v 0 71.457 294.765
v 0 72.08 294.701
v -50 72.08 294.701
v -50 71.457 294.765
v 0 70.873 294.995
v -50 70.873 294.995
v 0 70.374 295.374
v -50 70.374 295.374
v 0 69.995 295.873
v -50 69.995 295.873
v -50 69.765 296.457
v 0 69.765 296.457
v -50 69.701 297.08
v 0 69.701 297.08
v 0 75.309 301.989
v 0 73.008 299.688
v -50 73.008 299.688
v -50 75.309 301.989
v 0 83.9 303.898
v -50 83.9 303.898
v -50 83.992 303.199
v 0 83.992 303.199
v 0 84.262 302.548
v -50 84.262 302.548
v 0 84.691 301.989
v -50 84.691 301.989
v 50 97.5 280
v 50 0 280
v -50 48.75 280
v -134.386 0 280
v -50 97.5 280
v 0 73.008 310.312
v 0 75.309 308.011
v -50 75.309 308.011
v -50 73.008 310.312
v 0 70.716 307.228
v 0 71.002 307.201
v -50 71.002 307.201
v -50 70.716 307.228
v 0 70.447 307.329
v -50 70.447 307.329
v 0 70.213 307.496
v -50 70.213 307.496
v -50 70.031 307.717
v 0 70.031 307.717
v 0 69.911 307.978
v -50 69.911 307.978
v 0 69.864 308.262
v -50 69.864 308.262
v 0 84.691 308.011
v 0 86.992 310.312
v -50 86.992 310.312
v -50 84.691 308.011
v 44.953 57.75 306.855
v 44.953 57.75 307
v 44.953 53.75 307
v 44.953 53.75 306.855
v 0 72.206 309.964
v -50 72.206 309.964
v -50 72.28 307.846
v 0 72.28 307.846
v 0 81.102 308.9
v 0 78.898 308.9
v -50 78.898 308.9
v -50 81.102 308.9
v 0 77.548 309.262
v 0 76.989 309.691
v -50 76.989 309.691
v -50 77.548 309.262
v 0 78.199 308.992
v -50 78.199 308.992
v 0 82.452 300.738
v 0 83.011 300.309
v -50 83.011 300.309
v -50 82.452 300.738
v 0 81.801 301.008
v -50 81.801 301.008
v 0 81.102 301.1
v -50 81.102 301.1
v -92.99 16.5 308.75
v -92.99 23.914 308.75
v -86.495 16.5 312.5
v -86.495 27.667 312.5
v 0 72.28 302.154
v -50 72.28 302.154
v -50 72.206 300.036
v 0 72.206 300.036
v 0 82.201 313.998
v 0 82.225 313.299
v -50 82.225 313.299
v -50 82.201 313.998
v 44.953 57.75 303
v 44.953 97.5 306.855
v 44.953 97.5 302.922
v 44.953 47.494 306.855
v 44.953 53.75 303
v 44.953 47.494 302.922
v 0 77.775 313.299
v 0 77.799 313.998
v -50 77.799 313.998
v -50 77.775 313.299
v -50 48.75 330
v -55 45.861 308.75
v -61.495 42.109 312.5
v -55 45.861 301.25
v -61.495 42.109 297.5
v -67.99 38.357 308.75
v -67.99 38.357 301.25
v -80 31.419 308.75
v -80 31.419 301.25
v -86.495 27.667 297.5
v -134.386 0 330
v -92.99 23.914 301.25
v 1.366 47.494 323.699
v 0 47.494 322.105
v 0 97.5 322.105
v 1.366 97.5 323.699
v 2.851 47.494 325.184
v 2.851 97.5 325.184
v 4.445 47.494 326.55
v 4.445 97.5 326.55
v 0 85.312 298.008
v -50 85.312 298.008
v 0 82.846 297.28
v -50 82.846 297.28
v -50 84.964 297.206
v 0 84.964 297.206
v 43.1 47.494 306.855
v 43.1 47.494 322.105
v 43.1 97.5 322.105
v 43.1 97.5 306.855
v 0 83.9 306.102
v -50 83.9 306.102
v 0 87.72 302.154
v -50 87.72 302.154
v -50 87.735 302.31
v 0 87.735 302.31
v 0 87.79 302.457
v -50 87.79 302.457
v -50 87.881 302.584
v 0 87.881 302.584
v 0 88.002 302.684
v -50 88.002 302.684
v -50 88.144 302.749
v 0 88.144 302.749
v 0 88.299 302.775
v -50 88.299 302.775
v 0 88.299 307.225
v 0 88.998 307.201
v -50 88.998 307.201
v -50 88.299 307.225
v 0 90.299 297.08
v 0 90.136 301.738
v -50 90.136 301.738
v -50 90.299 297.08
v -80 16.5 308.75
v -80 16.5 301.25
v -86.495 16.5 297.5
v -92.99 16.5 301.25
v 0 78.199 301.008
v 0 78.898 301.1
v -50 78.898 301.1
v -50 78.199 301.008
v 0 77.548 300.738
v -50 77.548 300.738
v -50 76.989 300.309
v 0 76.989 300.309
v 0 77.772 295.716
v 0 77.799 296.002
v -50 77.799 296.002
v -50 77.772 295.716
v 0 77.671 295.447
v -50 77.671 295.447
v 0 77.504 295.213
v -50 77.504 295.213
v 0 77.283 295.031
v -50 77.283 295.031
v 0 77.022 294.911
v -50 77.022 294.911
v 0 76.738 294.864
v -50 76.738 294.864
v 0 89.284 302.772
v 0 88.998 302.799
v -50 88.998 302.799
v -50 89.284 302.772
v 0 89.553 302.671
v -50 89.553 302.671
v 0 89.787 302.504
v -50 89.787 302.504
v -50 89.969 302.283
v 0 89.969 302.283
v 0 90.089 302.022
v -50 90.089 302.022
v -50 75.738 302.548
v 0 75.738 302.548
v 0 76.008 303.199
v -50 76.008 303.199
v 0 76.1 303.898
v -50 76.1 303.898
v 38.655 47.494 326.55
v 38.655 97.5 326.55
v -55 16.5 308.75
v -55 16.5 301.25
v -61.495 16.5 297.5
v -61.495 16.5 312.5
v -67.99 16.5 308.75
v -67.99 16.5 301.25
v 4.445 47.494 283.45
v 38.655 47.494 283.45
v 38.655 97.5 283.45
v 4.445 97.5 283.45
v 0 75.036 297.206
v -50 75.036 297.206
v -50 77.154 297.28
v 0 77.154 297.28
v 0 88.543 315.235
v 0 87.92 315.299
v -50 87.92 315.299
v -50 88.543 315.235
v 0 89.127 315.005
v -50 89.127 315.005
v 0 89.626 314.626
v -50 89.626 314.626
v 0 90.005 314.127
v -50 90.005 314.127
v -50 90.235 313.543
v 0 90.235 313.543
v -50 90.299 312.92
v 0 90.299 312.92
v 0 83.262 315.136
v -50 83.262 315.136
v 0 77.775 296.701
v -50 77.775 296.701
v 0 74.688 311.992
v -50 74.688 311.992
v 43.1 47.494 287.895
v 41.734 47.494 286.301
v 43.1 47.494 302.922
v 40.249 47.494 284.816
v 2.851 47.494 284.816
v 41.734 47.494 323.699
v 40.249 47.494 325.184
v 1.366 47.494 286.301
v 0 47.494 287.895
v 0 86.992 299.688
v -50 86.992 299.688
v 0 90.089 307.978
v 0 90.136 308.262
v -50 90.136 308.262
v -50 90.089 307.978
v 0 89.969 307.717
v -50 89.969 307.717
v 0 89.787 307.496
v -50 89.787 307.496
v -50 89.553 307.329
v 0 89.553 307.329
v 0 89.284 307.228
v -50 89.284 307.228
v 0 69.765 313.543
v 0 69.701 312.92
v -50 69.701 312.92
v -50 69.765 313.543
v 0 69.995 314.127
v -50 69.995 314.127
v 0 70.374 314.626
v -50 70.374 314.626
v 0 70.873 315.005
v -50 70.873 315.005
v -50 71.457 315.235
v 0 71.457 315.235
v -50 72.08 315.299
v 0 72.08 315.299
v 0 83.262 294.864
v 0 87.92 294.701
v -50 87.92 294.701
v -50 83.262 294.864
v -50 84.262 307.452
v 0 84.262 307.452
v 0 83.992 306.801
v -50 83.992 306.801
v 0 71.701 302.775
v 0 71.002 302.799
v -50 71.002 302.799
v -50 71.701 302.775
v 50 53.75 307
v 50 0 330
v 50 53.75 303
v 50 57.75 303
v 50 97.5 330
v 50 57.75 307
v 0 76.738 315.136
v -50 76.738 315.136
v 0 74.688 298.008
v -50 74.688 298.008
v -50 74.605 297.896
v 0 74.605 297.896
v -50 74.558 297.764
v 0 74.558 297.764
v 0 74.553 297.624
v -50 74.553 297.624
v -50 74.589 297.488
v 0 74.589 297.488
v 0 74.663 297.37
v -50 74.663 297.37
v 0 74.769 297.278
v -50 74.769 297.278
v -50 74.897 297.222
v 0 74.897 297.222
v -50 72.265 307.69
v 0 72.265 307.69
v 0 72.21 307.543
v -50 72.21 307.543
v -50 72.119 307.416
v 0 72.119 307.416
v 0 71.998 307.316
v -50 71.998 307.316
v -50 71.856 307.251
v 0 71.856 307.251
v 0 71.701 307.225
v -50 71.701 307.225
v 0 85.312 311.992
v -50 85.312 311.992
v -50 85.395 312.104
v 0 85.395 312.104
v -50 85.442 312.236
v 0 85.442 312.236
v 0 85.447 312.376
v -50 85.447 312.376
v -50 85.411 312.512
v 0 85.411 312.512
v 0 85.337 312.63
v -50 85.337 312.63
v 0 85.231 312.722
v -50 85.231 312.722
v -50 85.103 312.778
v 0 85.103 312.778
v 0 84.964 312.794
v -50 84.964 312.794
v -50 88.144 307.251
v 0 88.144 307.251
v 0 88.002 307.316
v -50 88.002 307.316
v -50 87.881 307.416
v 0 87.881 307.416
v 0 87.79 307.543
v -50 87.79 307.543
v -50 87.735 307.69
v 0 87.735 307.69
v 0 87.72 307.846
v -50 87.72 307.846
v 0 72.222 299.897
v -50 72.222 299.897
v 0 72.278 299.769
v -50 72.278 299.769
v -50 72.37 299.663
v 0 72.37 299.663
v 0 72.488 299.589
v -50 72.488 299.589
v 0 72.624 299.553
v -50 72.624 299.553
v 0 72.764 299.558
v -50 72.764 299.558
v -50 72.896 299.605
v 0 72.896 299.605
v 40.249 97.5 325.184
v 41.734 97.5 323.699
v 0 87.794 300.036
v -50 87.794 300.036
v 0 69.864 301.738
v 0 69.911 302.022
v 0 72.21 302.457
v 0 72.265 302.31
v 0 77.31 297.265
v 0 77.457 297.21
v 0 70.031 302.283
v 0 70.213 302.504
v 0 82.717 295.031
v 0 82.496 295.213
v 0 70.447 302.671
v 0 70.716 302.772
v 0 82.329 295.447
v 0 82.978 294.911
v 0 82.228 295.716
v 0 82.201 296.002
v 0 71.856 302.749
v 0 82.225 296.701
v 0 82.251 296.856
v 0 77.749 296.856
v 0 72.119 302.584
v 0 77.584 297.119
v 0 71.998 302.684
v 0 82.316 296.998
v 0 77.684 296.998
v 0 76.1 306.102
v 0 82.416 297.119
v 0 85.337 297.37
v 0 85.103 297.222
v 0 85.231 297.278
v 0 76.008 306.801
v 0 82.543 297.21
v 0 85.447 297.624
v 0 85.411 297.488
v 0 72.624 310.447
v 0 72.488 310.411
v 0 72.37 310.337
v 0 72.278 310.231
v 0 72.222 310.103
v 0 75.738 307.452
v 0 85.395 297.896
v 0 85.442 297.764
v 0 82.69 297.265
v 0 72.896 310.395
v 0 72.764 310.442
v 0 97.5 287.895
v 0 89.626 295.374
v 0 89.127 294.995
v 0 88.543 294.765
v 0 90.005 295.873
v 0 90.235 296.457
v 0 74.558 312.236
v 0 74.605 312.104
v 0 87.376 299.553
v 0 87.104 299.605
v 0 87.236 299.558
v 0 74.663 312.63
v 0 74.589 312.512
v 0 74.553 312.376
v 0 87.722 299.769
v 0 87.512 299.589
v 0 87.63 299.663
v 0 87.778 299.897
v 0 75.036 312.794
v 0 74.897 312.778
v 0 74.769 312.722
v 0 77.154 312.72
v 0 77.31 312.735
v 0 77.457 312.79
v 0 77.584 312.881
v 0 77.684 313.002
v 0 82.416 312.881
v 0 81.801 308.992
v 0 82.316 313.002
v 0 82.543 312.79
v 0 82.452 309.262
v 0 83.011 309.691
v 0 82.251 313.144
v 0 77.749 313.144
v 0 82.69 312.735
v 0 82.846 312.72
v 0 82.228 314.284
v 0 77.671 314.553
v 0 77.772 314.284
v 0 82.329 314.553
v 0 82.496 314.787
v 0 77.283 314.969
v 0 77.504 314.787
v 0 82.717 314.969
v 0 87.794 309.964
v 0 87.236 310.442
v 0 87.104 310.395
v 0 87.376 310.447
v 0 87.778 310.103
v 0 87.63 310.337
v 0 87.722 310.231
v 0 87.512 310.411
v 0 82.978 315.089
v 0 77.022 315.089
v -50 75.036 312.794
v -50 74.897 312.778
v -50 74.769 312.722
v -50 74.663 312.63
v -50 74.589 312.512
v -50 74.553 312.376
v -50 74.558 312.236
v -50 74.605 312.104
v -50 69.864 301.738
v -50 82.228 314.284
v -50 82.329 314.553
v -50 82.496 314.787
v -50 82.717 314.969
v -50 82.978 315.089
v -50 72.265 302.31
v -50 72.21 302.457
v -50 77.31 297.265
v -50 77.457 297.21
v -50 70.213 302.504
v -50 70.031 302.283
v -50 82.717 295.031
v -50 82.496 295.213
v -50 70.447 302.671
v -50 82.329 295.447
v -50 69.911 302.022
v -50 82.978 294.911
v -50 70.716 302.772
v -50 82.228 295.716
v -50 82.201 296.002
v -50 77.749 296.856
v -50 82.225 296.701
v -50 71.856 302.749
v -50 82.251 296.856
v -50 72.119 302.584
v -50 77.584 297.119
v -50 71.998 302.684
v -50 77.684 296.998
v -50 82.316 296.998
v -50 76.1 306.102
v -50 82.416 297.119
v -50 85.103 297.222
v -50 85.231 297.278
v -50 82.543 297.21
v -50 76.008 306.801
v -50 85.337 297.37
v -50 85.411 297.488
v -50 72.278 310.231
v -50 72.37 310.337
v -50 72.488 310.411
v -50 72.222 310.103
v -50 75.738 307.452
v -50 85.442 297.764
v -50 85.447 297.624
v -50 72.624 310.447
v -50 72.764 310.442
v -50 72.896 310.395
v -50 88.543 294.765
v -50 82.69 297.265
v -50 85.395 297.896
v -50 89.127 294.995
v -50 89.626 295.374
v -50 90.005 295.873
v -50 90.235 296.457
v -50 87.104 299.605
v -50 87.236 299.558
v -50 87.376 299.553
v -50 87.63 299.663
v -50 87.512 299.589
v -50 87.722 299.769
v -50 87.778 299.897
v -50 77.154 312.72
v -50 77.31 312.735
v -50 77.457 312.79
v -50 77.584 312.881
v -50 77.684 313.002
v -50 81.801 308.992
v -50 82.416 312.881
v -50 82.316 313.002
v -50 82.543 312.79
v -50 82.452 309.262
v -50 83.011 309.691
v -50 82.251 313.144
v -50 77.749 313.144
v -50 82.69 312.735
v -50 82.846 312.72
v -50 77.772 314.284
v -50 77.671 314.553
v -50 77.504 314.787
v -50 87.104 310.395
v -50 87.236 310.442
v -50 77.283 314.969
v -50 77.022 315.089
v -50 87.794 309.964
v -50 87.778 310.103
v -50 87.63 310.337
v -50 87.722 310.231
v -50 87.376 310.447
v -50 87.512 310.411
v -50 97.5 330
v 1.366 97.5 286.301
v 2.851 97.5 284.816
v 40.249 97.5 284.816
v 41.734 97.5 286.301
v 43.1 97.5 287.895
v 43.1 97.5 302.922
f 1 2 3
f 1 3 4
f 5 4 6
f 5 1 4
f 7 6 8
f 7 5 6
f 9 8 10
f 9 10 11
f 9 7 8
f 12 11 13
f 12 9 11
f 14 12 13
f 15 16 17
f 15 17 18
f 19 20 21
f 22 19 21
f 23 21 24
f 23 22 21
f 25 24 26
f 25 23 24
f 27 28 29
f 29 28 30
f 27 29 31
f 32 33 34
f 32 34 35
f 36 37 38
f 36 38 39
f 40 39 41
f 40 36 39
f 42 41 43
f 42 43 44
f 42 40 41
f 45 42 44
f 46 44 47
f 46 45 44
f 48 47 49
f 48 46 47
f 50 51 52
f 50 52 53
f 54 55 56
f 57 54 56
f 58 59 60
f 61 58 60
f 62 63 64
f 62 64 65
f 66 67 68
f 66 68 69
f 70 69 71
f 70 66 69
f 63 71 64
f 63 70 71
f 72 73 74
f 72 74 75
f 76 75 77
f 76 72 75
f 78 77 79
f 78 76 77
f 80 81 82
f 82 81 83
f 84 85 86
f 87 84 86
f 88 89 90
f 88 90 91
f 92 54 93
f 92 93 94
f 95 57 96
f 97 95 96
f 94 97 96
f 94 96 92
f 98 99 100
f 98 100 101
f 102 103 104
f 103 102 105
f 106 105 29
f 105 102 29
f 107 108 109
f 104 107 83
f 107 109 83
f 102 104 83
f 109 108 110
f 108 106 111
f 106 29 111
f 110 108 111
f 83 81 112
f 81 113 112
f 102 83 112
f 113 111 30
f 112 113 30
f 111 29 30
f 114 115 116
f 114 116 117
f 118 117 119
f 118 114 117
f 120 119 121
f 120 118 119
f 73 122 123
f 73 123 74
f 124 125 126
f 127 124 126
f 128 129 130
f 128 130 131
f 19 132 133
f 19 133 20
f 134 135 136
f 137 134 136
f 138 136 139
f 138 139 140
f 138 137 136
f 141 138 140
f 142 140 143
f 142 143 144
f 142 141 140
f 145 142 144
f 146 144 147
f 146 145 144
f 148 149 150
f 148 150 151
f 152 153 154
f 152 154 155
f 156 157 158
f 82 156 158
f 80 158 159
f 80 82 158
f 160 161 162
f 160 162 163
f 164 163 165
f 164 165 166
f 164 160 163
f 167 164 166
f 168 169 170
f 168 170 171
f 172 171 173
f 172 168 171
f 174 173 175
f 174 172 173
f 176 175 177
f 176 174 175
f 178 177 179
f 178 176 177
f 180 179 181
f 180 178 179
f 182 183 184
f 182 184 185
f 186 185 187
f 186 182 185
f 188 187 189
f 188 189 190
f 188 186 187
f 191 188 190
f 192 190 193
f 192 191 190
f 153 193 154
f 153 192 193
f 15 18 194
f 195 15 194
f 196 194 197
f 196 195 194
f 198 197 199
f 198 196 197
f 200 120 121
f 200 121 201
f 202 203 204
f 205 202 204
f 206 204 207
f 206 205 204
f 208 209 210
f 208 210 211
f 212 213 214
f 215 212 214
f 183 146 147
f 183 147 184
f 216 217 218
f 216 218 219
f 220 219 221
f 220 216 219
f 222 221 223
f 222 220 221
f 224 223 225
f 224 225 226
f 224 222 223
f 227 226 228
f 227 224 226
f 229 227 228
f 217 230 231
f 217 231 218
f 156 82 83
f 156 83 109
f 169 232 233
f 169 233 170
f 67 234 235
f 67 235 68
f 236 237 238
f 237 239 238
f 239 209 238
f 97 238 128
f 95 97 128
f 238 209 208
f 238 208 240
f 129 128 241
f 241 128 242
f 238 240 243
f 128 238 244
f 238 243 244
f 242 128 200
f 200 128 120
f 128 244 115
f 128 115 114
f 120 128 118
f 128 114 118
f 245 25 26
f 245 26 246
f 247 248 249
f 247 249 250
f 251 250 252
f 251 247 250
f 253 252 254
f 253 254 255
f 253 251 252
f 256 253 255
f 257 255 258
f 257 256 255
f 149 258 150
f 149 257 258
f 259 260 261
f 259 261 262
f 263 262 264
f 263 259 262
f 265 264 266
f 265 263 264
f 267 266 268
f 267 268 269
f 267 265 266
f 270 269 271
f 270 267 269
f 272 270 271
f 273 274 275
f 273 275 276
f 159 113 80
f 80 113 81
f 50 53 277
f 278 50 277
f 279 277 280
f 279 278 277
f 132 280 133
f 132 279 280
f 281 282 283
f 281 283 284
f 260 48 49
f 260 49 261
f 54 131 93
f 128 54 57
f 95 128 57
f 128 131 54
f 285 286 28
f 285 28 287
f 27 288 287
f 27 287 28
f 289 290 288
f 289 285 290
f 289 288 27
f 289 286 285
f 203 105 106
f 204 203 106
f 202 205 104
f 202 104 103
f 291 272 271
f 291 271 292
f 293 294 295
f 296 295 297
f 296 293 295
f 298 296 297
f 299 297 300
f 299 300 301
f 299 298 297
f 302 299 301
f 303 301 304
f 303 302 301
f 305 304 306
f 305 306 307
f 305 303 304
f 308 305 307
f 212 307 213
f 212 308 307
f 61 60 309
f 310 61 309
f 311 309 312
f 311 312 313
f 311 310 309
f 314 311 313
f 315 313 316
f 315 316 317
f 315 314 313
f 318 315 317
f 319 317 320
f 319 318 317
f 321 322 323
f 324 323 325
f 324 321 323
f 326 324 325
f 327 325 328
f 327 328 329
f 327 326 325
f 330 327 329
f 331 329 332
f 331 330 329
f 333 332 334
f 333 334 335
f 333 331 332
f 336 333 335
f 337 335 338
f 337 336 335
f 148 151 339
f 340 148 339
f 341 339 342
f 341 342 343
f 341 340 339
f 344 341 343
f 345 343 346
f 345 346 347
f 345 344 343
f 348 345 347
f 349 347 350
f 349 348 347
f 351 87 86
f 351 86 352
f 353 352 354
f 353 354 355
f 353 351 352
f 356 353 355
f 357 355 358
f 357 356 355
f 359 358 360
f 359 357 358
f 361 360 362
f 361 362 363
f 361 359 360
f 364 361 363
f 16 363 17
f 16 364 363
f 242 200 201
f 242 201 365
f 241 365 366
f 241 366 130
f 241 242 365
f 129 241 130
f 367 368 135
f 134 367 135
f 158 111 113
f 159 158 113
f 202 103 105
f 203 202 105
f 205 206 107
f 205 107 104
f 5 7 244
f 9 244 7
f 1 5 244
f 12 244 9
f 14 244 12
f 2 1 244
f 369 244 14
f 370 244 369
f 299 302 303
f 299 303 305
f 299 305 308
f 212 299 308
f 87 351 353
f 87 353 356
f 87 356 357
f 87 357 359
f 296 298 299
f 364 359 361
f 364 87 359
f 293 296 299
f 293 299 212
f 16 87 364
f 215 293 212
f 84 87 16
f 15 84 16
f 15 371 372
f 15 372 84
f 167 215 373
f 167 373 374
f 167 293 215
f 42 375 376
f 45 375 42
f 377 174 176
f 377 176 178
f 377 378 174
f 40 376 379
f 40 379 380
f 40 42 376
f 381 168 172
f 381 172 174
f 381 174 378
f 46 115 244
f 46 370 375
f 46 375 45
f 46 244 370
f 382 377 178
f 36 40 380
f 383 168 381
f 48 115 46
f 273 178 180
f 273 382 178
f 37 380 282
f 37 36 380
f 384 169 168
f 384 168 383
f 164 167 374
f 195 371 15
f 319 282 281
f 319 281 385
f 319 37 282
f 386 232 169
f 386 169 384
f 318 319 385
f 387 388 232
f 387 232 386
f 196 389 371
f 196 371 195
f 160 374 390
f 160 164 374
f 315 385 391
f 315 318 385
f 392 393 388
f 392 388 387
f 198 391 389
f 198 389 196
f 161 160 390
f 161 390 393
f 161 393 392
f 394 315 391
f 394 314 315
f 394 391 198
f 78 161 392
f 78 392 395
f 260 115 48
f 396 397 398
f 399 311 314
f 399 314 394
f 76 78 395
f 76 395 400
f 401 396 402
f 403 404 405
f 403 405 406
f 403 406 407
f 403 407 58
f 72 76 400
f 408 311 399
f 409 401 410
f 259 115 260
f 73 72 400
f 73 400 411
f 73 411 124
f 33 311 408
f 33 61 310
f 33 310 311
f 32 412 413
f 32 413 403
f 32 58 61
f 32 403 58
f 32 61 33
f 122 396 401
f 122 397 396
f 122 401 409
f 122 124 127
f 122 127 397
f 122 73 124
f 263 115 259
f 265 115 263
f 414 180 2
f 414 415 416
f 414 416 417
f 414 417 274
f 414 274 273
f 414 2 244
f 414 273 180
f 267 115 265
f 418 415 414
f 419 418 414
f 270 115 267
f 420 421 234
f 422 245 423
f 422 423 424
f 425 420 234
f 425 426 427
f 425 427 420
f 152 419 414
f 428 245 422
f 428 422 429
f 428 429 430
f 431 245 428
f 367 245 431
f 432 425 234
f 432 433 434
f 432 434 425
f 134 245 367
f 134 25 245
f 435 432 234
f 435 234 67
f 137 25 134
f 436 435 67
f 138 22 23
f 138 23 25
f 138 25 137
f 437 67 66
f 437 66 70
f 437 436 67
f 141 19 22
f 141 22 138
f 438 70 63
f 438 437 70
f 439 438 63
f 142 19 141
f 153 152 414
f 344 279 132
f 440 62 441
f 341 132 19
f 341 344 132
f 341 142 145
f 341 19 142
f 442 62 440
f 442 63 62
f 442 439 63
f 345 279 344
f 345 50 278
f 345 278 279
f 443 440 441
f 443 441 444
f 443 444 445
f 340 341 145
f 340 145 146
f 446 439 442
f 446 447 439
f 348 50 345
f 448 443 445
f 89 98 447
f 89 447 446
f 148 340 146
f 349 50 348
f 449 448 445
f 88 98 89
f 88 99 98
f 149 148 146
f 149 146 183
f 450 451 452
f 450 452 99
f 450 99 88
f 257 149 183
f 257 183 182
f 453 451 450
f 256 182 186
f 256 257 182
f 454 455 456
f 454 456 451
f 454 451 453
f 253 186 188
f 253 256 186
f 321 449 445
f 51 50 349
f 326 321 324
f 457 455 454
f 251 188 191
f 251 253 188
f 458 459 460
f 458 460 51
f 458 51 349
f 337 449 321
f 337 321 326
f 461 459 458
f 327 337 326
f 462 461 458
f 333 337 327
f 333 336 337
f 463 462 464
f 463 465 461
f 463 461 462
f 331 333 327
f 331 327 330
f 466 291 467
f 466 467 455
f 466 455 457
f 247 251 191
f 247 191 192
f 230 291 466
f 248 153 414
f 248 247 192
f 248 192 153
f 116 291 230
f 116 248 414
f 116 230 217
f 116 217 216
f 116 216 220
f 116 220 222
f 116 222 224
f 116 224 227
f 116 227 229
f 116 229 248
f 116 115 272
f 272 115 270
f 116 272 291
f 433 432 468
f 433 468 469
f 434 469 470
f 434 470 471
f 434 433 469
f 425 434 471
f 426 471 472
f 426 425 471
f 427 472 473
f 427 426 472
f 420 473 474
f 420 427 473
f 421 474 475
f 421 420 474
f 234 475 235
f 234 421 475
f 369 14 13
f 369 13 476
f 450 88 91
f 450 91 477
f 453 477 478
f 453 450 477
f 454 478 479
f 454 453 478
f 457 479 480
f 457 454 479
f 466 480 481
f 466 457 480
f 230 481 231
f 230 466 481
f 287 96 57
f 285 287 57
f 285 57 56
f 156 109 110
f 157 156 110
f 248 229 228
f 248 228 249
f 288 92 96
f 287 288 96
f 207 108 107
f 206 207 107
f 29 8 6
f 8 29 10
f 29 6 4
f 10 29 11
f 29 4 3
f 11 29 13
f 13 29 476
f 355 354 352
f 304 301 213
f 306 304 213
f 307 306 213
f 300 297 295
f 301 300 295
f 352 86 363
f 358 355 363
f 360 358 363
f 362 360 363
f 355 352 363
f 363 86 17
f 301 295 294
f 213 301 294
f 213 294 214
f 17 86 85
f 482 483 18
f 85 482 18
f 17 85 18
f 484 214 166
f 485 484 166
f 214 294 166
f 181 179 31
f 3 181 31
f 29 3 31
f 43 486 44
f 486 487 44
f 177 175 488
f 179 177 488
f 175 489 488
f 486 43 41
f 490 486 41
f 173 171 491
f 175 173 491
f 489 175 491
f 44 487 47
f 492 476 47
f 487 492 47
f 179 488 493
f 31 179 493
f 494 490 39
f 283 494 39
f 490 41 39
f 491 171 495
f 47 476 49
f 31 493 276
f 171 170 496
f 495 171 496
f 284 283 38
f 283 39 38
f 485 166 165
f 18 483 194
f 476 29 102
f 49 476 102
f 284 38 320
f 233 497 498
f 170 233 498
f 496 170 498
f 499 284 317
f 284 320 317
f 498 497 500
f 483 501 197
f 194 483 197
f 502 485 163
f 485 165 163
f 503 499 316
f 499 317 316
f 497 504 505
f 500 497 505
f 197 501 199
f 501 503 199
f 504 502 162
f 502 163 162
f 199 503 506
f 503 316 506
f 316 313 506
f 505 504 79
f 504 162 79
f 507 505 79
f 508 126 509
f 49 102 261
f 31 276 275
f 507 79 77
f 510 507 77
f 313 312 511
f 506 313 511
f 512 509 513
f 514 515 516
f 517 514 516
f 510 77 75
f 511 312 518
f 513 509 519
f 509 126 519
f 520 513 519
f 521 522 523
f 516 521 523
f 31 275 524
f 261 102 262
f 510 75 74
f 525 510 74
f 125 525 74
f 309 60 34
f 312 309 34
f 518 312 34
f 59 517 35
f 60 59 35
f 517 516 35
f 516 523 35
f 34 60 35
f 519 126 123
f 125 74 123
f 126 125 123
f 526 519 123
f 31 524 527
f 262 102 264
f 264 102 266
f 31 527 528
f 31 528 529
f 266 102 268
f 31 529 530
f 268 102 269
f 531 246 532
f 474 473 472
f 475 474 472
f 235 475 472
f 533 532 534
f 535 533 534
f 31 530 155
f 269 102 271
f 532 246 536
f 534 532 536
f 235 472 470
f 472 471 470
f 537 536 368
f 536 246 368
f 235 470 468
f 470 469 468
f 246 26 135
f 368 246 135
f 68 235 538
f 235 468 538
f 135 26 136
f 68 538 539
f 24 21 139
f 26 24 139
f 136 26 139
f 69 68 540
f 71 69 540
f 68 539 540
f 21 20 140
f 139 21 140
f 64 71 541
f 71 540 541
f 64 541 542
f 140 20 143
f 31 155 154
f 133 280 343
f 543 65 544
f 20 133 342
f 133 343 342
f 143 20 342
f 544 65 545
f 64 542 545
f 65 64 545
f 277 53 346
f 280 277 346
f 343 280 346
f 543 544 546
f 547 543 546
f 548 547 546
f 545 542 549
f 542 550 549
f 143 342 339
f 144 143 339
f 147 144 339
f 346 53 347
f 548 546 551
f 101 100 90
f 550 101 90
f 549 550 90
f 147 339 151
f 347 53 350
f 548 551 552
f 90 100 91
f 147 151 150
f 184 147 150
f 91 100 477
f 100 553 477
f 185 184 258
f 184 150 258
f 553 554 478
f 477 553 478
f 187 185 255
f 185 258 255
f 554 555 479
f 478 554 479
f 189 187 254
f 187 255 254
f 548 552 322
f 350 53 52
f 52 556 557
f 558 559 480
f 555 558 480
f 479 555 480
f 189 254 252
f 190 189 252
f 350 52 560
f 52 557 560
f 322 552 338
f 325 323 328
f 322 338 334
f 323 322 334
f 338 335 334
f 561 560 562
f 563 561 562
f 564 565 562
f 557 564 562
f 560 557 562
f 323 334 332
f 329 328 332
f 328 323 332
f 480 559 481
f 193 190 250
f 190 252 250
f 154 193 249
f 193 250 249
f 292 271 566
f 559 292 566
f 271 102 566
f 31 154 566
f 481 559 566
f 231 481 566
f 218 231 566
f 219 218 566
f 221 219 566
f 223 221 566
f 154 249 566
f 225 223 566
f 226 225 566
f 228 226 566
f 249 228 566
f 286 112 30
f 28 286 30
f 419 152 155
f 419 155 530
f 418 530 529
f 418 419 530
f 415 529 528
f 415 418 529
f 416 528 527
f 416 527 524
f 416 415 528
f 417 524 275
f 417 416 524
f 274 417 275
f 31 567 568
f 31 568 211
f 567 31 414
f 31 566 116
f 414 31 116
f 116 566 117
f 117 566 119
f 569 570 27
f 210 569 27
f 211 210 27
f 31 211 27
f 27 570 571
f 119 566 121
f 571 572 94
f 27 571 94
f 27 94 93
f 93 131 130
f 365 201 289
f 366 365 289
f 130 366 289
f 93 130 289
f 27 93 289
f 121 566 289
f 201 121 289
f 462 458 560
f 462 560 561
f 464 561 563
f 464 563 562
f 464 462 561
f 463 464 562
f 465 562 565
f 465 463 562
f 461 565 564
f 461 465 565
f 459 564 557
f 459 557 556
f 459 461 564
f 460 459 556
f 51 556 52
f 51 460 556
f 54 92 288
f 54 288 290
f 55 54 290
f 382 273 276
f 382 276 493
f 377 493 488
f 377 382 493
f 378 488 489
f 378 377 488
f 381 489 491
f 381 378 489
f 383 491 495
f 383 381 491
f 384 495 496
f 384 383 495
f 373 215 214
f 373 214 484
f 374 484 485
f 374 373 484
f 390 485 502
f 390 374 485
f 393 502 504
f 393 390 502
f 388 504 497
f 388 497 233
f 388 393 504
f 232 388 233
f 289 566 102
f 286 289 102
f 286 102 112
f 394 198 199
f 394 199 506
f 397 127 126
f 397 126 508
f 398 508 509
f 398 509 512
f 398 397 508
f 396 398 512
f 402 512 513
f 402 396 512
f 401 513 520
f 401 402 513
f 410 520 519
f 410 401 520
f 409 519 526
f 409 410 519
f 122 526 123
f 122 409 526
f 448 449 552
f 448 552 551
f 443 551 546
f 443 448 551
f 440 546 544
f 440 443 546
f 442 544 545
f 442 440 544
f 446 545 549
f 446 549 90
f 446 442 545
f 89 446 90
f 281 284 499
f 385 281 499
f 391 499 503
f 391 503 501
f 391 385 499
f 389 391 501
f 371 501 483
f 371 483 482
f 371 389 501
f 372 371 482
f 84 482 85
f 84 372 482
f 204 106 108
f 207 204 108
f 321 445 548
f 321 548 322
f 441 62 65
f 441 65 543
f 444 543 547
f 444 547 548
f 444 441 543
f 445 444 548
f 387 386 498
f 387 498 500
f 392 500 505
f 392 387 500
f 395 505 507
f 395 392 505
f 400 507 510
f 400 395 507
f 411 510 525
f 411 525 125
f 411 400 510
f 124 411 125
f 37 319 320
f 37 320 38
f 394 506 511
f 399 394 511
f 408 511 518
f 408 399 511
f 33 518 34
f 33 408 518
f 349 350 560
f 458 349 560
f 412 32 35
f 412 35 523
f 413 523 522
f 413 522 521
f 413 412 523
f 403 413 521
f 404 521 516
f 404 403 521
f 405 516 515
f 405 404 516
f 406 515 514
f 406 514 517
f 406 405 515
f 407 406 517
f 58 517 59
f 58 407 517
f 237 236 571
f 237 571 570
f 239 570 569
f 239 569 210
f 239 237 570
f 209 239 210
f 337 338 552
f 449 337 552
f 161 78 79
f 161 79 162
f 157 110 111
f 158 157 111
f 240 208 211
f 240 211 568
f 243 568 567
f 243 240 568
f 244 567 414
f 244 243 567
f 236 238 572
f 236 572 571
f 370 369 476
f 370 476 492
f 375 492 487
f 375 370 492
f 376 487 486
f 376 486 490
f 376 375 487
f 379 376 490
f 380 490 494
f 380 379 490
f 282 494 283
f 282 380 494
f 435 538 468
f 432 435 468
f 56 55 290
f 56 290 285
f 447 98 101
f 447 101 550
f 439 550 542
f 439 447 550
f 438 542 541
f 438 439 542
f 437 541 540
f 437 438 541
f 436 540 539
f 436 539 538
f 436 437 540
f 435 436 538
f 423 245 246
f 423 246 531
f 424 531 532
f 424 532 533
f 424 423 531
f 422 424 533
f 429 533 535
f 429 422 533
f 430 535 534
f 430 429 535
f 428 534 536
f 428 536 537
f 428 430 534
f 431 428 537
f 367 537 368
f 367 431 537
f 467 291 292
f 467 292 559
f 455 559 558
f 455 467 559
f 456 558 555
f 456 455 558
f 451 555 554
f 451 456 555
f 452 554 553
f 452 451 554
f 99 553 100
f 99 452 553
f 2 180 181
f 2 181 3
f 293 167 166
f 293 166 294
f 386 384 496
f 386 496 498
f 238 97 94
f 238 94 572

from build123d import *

# Parameters (mm, degrees)
SKETCH1_W           = 35
SKETCH1_H           = 50
SKETCH1_W_2         = 62.5
BOSS_EXTRUDE1_DEPTH = 50
BOSS_EXTRUDE2_DEPTH = 50
CUT_EXTRUDE1_DEPTH  = 81
BOSS_EXTRUDE3_DEPTH = 50.006
SKETCH5_W           = 4
SKETCH5_H           = 4
CUT_EXTRUDE2_DEPTH  = 30
BOSS_EXTRUDE4_DEPTH = 50


with BuildPart() as part:
    # Sketch1 → Boss-Extrude1 (new body)
    # profile 1 of 2: a face of its own
    with BuildSketch(Plane.YZ):
        with Locations((80, 305)):
            Rectangle(SKETCH1_W, SKETCH1_H)
        with BuildLine():
            Line((76.1, 303.897755224), (76.1, 306.102244776))
            ThreePointArc((76.1, 306.102244776), (75.894474738, 307.135490044), (75.309188309, 308.011433085))
            Line((75.309188309, 308.011433085), (73.008308049, 310.312313346))
            ThreePointArc((73.008308049, 310.312313346), (72.488454457, 310.411010634), (72.206097787, 309.963502397))
            Line((72.206097787, 309.963502397), (72.280053987, 307.845673932))
            ThreePointArc((72.280053987, 307.845673932), (72.119231712, 307.415535218), (71.701359189, 307.225099738))
            Line((71.701359189, 307.225099738), (71.00178561, 307.20067009))
            ThreePointArc((71.00178561, 307.20067009), (70.213197967, 307.495510928), (69.864066254, 308.261610554))
            Line((69.864066254, 308.261610554), (69.701401098, 312.919731158))
            ThreePointArc((69.701401098, 312.919731158), (70.373654403, 314.626345597), (72.080268842, 315.298598902))
            Line((72.080268842, 315.298598902), (76.738389446, 315.135933746))
            ThreePointArc((76.738389446, 315.135933746), (77.504489072, 314.786802033), (77.79932991, 313.99821439))
            Line((77.79932991, 313.99821439), (77.774900262, 313.298640811))
            ThreePointArc((77.774900262, 313.298640811), (77.584464782, 312.880768288), (77.154326068, 312.719946013))
            Line((77.154326068, 312.719946013), (75.036497603, 312.793902213))
            ThreePointArc((75.036497603, 312.793902213), (74.588989366, 312.511545543), (74.687686654, 311.991691951))
            Line((74.687686654, 311.991691951), (76.988566915, 309.690811691))
            ThreePointArc((76.988566915, 309.690811691), (77.864509956, 309.105525262), (78.897755224, 308.9))
            Line((78.897755224, 308.9), (81.102244776, 308.9))
            ThreePointArc((81.102244776, 308.9), (82.135490044, 309.105525262), (83.011433085, 309.690811691))
            Line((83.011433085, 309.690811691), (85.312313346, 311.991691951))
            ThreePointArc((85.312313346, 311.991691951), (85.411010634, 312.511545543), (84.963502397, 312.793902213))
            Line((84.963502397, 312.793902213), (82.845673932, 312.719946013))
            ThreePointArc((82.845673932, 312.719946013), (82.415535218, 312.880768288), (82.225099738, 313.298640811))
            Line((82.225099738, 313.298640811), (82.20067009, 313.99821439))
            ThreePointArc((82.20067009, 313.99821439), (82.495510928, 314.786802033), (83.261610554, 315.135933746))
            Line((83.261610554, 315.135933746), (87.919731158, 315.298598902))
            ThreePointArc((87.919731158, 315.298598902), (89.626345597, 314.626345597), (90.298598902, 312.919731158))
            Line((90.298598902, 312.919731158), (90.135933746, 308.261610554))
            ThreePointArc((90.135933746, 308.261610554), (89.786802033, 307.495510928), (88.99821439, 307.20067009))
            Line((88.99821439, 307.20067009), (88.298640811, 307.225099738))
            ThreePointArc((88.298640811, 307.225099738), (87.880768288, 307.415535218), (87.719946013, 307.845673932))
            Line((87.719946013, 307.845673932), (87.793902213, 309.963502397))
            ThreePointArc((87.793902213, 309.963502397), (87.511545543, 310.411010634), (86.991691951, 310.312313346))
            Line((86.991691951, 310.312313346), (84.690811691, 308.011433085))
            ThreePointArc((84.690811691, 308.011433085), (84.105525262, 307.135490044), (83.9, 306.102244776))
            Line((83.9, 306.102244776), (83.9, 303.897755224))
            ThreePointArc((83.9, 303.897755224), (84.105525262, 302.864509956), (84.690811691, 301.988566915))
            Line((84.690811691, 301.988566915), (86.991691951, 299.687686654))
            ThreePointArc((86.991691951, 299.687686654), (87.511545543, 299.588989366), (87.793902213, 300.036497603))
            Line((87.793902213, 300.036497603), (87.719946013, 302.154326068))
            ThreePointArc((87.719946013, 302.154326068), (87.880768288, 302.584464782), (88.298640811, 302.774900262))
            Line((88.298640811, 302.774900262), (88.99821439, 302.79932991))
            ThreePointArc((88.99821439, 302.79932991), (89.786802033, 302.504489072), (90.135933746, 301.738389446))
            Line((90.135933746, 301.738389446), (90.298598902, 297.080268842))
            ThreePointArc((90.298598902, 297.080268842), (89.626345597, 295.373654403), (87.919731158, 294.701401098))
            Line((87.919731158, 294.701401098), (83.261610554, 294.864066254))
            ThreePointArc((83.261610554, 294.864066254), (82.495510928, 295.213197967), (82.20067009, 296.00178561))
            Line((82.20067009, 296.00178561), (82.225099738, 296.701359189))
            ThreePointArc((82.225099738, 296.701359189), (82.415535218, 297.119231712), (82.845673932, 297.280053987))
            Line((82.845673932, 297.280053987), (84.963502397, 297.206097787))
            ThreePointArc((84.963502397, 297.206097787), (85.411010634, 297.488454457), (85.312313346, 298.008308049))
            Line((85.312313346, 298.008308049), (83.011433085, 300.309188309))
            ThreePointArc((83.011433085, 300.309188309), (82.135490044, 300.894474738), (81.102244776, 301.1))
            Line((81.102244776, 301.1), (78.897755224, 301.1))
            ThreePointArc((78.897755224, 301.1), (77.864509956, 300.894474738), (76.988566915, 300.309188309))
            Line((76.988566915, 300.309188309), (74.687686654, 298.008308049))
            ThreePointArc((74.687686654, 298.008308049), (74.588989366, 297.488454457), (75.036497603, 297.206097787))
            Line((75.036497603, 297.206097787), (77.154326068, 297.280053987))
            ThreePointArc((77.154326068, 297.280053987), (77.584464782, 297.119231712), (77.774900262, 296.701359189))
            Line((77.774900262, 296.701359189), (77.79932991, 296.00178561))
            ThreePointArc((77.79932991, 296.00178561), (77.504489072, 295.213197967), (76.738389446, 294.864066254))
            Line((76.738389446, 294.864066254), (72.080268842, 294.701401098))
            ThreePointArc((72.080268842, 294.701401098), (70.373654403, 295.373654403), (69.701401098, 297.080268842))
            Line((69.701401098, 297.080268842), (69.864066254, 301.738389446))
            ThreePointArc((69.864066254, 301.738389446), (70.213197967, 302.504489072), (71.00178561, 302.79932991))
            Line((71.00178561, 302.79932991), (71.701359189, 302.774900262))
            ThreePointArc((71.701359189, 302.774900262), (72.119231712, 302.584464782), (72.280053987, 302.154326068))
            Line((72.280053987, 302.154326068), (72.206097787, 300.036497603))
            ThreePointArc((72.206097787, 300.036497603), (72.488454457, 299.588989366), (73.008308049, 299.687686654))
            Line((73.008308049, 299.687686654), (75.309188309, 301.988566915))
            ThreePointArc((75.309188309, 301.988566915), (75.894474738, 302.864509956), (76.1, 303.897755224))
        make_face(mode=Mode.SUBTRACT)
    # profile 2 of 2: a face of its own
    with BuildSketch(Plane.YZ):
        with Locations((31.25, 305)):
            Rectangle(SKETCH1_W_2, SKETCH1_H)
    extrude(amount=-BOSS_EXTRUDE1_DEPTH)

    # Sketch2 → Boss-Extrude2 (add)
    with BuildSketch(Plane(origin=(0, 0, 280), x_dir=(1, 0, 0), z_dir=(0, 0, -1))):
        Polygon((-50, -48.75), (-134.386033469, 0), (-50, 0), align=None)
    extrude(amount=-BOSS_EXTRUDE2_DEPTH)

    # Sketch3 → Cut-Extrude1 (cut)
    with BuildSketch(Plane(origin=(0, 97.5, 0), x_dir=(-1, 0, 0), z_dir=(0, 1, 0))):
        Polygon((67.990381057, 308.75), (61.495190528, 312.5), (55, 308.75), (55, 301.25), (61.495190528, 297.5), (67.990381057, 301.25), align=None)
        Polygon((92.990381057, 308.75), (86.495190528, 312.5), (80, 308.75), (80, 301.25), (86.495190528, 297.5), (92.990381057, 301.25), align=None)
    extrude(amount=-CUT_EXTRUDE1_DEPTH, mode=Mode.SUBTRACT)

    # Sketch4 → Boss-Extrude3 (add)
    with BuildSketch(Plane.XZ.offset(-47.494)):
        with BuildLine():
            Line((43.1, 322.104760785), (43.1, 306.85548466))
            Line((43.1, 306.85548466), (44.953275281, 306.85548466))
            Line((44.953275281, 306.85548466), (44.953275281, 302.922372887))
            Line((44.953275281, 302.922372887), (43.1, 302.922372887))
            Line((43.1, 302.922372887), (43.1, 287.895239215))
            ThreePointArc((43.1, 287.895239215), (41.005760925, 285.544239075), (38.654760785, 283.45))
            Line((38.654760785, 283.45), (4.445239215, 283.45))
            ThreePointArc((4.445239215, 283.45), (2.094239075, 285.544239075), (0, 287.895239215))
            Line((0, 287.895239215), (0, 280))
            Line((0, 280), (50, 280))
            Line((50, 280), (50, 330))
            Line((50, 330), (0, 330))
            Line((0, 330), (0, 322.104760785))
            ThreePointArc((0, 322.104760785), (2.094239075, 324.455760925), (4.445239215, 326.55))
            Line((4.445239215, 326.55), (38.654760785, 326.55))
            ThreePointArc((38.654760785, 326.55), (41.005760925, 324.455760925), (43.1, 322.104760785))
        make_face()
    extrude(amount=-BOSS_EXTRUDE3_DEPTH)

    # Sketch5 → Cut-Extrude2 (cut)
    with BuildSketch(Plane(origin=(44.953275281, 0, 0), x_dir=(0, -1, 0), z_dir=(-1, 0, 0))):
        with Locations((-55.75, 305)):
            Rectangle(SKETCH5_W, SKETCH5_H)
    extrude(amount=-CUT_EXTRUDE2_DEPTH, mode=Mode.SUBTRACT)

    # Sketch6 → Boss-Extrude4 (add)
    with BuildSketch(Plane.YZ):
        Polygon((0, 280), (47.494, 280), (47.494, 287.895239215), (47.494, 322.104760785), (47.494, 330), (0, 330), align=None)
    extrude(amount=BOSS_EXTRUDE4_DEPTH)


solid = part.part
